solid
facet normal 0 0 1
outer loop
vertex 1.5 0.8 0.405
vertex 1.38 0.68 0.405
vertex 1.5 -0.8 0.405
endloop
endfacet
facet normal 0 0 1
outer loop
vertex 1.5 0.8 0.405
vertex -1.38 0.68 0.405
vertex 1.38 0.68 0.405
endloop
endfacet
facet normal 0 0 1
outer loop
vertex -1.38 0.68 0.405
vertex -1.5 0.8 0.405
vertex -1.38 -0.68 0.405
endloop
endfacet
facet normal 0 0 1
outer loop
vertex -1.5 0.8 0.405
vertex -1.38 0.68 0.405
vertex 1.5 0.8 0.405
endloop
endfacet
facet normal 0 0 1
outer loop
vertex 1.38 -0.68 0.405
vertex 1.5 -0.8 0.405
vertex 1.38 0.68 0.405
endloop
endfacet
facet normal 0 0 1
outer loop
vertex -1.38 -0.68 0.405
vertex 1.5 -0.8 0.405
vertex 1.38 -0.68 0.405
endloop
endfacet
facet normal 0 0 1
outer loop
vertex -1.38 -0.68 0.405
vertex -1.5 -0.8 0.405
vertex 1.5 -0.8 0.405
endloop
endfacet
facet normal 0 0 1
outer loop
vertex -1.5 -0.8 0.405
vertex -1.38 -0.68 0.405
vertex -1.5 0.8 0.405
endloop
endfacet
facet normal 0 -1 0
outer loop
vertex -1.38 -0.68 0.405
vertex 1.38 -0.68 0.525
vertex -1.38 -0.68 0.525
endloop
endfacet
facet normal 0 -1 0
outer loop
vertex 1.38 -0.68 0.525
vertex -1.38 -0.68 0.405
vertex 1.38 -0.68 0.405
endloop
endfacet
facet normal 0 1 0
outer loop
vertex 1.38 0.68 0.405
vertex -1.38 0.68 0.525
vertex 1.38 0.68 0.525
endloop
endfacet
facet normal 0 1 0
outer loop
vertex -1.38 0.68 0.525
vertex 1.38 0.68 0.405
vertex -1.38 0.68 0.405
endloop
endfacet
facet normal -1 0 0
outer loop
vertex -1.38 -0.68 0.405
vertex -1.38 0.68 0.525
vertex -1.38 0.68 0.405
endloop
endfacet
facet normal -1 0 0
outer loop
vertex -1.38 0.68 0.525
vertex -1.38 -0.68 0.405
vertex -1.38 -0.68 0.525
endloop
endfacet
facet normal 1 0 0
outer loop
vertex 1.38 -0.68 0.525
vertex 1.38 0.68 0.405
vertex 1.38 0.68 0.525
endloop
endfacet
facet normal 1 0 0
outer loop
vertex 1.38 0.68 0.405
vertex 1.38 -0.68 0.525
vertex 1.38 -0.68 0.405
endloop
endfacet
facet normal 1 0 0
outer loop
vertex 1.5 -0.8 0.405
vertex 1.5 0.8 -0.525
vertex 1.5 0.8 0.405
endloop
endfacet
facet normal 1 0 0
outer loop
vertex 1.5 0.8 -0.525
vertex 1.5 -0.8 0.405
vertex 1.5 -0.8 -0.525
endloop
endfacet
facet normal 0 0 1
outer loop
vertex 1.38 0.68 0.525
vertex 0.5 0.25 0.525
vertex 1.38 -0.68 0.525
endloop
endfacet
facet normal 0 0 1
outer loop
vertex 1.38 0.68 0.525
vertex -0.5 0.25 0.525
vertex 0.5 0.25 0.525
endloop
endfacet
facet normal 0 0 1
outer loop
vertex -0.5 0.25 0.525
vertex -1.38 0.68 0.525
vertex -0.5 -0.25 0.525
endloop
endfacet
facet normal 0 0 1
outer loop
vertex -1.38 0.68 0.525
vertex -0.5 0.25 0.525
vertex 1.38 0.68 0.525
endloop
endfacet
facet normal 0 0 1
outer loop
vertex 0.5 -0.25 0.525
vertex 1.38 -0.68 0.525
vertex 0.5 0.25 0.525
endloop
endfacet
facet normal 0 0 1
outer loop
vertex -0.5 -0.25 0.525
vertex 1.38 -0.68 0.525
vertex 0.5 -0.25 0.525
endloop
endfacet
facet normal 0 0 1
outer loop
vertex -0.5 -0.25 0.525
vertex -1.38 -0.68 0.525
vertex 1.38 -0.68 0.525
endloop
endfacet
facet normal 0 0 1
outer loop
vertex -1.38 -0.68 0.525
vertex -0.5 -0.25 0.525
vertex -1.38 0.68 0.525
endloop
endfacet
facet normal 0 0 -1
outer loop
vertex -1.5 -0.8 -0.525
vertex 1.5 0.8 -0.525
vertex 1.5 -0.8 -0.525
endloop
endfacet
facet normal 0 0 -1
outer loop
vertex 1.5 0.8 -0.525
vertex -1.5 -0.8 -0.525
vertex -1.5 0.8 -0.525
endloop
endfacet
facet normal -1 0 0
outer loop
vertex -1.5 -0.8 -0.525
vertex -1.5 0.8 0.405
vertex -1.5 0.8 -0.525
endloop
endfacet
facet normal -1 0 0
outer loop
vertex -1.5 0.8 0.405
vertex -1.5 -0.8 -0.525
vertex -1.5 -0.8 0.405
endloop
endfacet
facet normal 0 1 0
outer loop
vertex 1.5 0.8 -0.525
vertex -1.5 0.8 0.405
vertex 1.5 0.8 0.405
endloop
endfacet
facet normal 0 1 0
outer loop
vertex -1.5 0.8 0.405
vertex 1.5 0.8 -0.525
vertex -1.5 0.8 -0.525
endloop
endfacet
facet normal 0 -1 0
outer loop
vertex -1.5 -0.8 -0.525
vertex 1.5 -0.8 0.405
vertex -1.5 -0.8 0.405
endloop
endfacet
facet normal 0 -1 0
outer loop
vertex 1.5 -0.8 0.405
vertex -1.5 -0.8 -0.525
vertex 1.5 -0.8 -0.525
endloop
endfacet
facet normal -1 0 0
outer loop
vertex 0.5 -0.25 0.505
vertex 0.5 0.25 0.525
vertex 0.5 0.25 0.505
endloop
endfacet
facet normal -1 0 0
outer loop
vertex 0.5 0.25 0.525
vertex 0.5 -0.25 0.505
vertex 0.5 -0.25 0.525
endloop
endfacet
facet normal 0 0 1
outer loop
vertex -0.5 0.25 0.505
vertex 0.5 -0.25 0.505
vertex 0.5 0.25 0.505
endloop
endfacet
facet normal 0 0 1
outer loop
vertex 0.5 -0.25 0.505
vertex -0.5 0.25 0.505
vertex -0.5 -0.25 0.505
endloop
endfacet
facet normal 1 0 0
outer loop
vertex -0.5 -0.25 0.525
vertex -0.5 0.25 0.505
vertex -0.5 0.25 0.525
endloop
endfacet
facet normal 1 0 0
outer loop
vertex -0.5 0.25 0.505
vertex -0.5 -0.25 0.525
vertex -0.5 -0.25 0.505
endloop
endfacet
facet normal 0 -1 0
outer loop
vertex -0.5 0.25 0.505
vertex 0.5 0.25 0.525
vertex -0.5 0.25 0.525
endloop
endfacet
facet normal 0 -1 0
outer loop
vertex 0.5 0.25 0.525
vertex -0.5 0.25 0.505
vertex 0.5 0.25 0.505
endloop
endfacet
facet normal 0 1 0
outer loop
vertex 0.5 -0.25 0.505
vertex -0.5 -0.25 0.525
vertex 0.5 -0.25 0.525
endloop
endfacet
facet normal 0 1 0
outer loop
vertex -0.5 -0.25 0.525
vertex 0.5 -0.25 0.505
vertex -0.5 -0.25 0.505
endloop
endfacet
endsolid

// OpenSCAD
$fn = 48;

// Target overall size (mm)
body_L = 3.0;
body_W = 1.6;
body_H = 1.05;

// Terminations (metal ends) - kept flush with body envelope
term_L = 0.35;
term_thk = 0.05;
term_W_margin = 0.10;

// Top marking (slightly recessed)
mark_L = 1.0;
mark_W = 0.5;
mark_thk = 0.02;

// Body edge shaping (top chamfer only)
edge_chamfer = 0.12;

// Small overlap to guarantee watertight unions/differences
eps = 0.02;

// --- Helpers ---
function clamp(v, lo, hi) = v < lo ? lo : (v > hi ? hi : v);
ch = clamp(edge_chamfer, 0, min(body_L, body_W, body_H)/3);

// --- Geometry ---
module body_with_top_chamfer() {
    difference() {
        cube([body_L, body_W, body_H], center=true);

        // Remove material at the top edges to create a simple chamfer band
        // Long edges (along X) at +Z, +/-Y
        for (sy = [-1, 1])
            translate([0,
                       sy*(body_W/2 - ch/2 + eps/2),
                       body_H/2 - ch/2 + eps/2])
                cube([body_L + 2*eps, ch + eps, ch + eps], center=true);

        // Short edges (along Y) at +Z, +/-X
        for (sx = [-1, 1])
            translate([sx*(body_L/2 - ch/2 + eps/2),
                       0,
                       body_H/2 - ch/2 + eps/2])
                cube([ch + eps, body_W + 2*eps, ch + eps], center=true);
    }
}

module termination(sx=1) {
    // Termination sits on the bottom face and overlaps into the body by eps.
    // It does NOT extend beyond the overall [body_L, body_W, body_H] envelope.
    translate([sx*(body_L/2 - term_L/2 - eps),
               0,
               -body_H/2 + term_thk/2 + eps])
        cube([term_L, body_W - 2*term_W_margin, term_thk], center=true);
}

module recessed_mark() {
    // Recess into the top surface
    translate([0, 0, body_H/2 - mark_thk/2 + eps])
        cube([mark_L, mark_W, mark_thk + 2*eps], center=true);
}

// --- Final model: one connected solid, overall size matches body_* ---
difference() {
    union() {
        body_with_top_chamfer();
        termination(1);
        termination(-1);
    }
    recessed_mark();
}
